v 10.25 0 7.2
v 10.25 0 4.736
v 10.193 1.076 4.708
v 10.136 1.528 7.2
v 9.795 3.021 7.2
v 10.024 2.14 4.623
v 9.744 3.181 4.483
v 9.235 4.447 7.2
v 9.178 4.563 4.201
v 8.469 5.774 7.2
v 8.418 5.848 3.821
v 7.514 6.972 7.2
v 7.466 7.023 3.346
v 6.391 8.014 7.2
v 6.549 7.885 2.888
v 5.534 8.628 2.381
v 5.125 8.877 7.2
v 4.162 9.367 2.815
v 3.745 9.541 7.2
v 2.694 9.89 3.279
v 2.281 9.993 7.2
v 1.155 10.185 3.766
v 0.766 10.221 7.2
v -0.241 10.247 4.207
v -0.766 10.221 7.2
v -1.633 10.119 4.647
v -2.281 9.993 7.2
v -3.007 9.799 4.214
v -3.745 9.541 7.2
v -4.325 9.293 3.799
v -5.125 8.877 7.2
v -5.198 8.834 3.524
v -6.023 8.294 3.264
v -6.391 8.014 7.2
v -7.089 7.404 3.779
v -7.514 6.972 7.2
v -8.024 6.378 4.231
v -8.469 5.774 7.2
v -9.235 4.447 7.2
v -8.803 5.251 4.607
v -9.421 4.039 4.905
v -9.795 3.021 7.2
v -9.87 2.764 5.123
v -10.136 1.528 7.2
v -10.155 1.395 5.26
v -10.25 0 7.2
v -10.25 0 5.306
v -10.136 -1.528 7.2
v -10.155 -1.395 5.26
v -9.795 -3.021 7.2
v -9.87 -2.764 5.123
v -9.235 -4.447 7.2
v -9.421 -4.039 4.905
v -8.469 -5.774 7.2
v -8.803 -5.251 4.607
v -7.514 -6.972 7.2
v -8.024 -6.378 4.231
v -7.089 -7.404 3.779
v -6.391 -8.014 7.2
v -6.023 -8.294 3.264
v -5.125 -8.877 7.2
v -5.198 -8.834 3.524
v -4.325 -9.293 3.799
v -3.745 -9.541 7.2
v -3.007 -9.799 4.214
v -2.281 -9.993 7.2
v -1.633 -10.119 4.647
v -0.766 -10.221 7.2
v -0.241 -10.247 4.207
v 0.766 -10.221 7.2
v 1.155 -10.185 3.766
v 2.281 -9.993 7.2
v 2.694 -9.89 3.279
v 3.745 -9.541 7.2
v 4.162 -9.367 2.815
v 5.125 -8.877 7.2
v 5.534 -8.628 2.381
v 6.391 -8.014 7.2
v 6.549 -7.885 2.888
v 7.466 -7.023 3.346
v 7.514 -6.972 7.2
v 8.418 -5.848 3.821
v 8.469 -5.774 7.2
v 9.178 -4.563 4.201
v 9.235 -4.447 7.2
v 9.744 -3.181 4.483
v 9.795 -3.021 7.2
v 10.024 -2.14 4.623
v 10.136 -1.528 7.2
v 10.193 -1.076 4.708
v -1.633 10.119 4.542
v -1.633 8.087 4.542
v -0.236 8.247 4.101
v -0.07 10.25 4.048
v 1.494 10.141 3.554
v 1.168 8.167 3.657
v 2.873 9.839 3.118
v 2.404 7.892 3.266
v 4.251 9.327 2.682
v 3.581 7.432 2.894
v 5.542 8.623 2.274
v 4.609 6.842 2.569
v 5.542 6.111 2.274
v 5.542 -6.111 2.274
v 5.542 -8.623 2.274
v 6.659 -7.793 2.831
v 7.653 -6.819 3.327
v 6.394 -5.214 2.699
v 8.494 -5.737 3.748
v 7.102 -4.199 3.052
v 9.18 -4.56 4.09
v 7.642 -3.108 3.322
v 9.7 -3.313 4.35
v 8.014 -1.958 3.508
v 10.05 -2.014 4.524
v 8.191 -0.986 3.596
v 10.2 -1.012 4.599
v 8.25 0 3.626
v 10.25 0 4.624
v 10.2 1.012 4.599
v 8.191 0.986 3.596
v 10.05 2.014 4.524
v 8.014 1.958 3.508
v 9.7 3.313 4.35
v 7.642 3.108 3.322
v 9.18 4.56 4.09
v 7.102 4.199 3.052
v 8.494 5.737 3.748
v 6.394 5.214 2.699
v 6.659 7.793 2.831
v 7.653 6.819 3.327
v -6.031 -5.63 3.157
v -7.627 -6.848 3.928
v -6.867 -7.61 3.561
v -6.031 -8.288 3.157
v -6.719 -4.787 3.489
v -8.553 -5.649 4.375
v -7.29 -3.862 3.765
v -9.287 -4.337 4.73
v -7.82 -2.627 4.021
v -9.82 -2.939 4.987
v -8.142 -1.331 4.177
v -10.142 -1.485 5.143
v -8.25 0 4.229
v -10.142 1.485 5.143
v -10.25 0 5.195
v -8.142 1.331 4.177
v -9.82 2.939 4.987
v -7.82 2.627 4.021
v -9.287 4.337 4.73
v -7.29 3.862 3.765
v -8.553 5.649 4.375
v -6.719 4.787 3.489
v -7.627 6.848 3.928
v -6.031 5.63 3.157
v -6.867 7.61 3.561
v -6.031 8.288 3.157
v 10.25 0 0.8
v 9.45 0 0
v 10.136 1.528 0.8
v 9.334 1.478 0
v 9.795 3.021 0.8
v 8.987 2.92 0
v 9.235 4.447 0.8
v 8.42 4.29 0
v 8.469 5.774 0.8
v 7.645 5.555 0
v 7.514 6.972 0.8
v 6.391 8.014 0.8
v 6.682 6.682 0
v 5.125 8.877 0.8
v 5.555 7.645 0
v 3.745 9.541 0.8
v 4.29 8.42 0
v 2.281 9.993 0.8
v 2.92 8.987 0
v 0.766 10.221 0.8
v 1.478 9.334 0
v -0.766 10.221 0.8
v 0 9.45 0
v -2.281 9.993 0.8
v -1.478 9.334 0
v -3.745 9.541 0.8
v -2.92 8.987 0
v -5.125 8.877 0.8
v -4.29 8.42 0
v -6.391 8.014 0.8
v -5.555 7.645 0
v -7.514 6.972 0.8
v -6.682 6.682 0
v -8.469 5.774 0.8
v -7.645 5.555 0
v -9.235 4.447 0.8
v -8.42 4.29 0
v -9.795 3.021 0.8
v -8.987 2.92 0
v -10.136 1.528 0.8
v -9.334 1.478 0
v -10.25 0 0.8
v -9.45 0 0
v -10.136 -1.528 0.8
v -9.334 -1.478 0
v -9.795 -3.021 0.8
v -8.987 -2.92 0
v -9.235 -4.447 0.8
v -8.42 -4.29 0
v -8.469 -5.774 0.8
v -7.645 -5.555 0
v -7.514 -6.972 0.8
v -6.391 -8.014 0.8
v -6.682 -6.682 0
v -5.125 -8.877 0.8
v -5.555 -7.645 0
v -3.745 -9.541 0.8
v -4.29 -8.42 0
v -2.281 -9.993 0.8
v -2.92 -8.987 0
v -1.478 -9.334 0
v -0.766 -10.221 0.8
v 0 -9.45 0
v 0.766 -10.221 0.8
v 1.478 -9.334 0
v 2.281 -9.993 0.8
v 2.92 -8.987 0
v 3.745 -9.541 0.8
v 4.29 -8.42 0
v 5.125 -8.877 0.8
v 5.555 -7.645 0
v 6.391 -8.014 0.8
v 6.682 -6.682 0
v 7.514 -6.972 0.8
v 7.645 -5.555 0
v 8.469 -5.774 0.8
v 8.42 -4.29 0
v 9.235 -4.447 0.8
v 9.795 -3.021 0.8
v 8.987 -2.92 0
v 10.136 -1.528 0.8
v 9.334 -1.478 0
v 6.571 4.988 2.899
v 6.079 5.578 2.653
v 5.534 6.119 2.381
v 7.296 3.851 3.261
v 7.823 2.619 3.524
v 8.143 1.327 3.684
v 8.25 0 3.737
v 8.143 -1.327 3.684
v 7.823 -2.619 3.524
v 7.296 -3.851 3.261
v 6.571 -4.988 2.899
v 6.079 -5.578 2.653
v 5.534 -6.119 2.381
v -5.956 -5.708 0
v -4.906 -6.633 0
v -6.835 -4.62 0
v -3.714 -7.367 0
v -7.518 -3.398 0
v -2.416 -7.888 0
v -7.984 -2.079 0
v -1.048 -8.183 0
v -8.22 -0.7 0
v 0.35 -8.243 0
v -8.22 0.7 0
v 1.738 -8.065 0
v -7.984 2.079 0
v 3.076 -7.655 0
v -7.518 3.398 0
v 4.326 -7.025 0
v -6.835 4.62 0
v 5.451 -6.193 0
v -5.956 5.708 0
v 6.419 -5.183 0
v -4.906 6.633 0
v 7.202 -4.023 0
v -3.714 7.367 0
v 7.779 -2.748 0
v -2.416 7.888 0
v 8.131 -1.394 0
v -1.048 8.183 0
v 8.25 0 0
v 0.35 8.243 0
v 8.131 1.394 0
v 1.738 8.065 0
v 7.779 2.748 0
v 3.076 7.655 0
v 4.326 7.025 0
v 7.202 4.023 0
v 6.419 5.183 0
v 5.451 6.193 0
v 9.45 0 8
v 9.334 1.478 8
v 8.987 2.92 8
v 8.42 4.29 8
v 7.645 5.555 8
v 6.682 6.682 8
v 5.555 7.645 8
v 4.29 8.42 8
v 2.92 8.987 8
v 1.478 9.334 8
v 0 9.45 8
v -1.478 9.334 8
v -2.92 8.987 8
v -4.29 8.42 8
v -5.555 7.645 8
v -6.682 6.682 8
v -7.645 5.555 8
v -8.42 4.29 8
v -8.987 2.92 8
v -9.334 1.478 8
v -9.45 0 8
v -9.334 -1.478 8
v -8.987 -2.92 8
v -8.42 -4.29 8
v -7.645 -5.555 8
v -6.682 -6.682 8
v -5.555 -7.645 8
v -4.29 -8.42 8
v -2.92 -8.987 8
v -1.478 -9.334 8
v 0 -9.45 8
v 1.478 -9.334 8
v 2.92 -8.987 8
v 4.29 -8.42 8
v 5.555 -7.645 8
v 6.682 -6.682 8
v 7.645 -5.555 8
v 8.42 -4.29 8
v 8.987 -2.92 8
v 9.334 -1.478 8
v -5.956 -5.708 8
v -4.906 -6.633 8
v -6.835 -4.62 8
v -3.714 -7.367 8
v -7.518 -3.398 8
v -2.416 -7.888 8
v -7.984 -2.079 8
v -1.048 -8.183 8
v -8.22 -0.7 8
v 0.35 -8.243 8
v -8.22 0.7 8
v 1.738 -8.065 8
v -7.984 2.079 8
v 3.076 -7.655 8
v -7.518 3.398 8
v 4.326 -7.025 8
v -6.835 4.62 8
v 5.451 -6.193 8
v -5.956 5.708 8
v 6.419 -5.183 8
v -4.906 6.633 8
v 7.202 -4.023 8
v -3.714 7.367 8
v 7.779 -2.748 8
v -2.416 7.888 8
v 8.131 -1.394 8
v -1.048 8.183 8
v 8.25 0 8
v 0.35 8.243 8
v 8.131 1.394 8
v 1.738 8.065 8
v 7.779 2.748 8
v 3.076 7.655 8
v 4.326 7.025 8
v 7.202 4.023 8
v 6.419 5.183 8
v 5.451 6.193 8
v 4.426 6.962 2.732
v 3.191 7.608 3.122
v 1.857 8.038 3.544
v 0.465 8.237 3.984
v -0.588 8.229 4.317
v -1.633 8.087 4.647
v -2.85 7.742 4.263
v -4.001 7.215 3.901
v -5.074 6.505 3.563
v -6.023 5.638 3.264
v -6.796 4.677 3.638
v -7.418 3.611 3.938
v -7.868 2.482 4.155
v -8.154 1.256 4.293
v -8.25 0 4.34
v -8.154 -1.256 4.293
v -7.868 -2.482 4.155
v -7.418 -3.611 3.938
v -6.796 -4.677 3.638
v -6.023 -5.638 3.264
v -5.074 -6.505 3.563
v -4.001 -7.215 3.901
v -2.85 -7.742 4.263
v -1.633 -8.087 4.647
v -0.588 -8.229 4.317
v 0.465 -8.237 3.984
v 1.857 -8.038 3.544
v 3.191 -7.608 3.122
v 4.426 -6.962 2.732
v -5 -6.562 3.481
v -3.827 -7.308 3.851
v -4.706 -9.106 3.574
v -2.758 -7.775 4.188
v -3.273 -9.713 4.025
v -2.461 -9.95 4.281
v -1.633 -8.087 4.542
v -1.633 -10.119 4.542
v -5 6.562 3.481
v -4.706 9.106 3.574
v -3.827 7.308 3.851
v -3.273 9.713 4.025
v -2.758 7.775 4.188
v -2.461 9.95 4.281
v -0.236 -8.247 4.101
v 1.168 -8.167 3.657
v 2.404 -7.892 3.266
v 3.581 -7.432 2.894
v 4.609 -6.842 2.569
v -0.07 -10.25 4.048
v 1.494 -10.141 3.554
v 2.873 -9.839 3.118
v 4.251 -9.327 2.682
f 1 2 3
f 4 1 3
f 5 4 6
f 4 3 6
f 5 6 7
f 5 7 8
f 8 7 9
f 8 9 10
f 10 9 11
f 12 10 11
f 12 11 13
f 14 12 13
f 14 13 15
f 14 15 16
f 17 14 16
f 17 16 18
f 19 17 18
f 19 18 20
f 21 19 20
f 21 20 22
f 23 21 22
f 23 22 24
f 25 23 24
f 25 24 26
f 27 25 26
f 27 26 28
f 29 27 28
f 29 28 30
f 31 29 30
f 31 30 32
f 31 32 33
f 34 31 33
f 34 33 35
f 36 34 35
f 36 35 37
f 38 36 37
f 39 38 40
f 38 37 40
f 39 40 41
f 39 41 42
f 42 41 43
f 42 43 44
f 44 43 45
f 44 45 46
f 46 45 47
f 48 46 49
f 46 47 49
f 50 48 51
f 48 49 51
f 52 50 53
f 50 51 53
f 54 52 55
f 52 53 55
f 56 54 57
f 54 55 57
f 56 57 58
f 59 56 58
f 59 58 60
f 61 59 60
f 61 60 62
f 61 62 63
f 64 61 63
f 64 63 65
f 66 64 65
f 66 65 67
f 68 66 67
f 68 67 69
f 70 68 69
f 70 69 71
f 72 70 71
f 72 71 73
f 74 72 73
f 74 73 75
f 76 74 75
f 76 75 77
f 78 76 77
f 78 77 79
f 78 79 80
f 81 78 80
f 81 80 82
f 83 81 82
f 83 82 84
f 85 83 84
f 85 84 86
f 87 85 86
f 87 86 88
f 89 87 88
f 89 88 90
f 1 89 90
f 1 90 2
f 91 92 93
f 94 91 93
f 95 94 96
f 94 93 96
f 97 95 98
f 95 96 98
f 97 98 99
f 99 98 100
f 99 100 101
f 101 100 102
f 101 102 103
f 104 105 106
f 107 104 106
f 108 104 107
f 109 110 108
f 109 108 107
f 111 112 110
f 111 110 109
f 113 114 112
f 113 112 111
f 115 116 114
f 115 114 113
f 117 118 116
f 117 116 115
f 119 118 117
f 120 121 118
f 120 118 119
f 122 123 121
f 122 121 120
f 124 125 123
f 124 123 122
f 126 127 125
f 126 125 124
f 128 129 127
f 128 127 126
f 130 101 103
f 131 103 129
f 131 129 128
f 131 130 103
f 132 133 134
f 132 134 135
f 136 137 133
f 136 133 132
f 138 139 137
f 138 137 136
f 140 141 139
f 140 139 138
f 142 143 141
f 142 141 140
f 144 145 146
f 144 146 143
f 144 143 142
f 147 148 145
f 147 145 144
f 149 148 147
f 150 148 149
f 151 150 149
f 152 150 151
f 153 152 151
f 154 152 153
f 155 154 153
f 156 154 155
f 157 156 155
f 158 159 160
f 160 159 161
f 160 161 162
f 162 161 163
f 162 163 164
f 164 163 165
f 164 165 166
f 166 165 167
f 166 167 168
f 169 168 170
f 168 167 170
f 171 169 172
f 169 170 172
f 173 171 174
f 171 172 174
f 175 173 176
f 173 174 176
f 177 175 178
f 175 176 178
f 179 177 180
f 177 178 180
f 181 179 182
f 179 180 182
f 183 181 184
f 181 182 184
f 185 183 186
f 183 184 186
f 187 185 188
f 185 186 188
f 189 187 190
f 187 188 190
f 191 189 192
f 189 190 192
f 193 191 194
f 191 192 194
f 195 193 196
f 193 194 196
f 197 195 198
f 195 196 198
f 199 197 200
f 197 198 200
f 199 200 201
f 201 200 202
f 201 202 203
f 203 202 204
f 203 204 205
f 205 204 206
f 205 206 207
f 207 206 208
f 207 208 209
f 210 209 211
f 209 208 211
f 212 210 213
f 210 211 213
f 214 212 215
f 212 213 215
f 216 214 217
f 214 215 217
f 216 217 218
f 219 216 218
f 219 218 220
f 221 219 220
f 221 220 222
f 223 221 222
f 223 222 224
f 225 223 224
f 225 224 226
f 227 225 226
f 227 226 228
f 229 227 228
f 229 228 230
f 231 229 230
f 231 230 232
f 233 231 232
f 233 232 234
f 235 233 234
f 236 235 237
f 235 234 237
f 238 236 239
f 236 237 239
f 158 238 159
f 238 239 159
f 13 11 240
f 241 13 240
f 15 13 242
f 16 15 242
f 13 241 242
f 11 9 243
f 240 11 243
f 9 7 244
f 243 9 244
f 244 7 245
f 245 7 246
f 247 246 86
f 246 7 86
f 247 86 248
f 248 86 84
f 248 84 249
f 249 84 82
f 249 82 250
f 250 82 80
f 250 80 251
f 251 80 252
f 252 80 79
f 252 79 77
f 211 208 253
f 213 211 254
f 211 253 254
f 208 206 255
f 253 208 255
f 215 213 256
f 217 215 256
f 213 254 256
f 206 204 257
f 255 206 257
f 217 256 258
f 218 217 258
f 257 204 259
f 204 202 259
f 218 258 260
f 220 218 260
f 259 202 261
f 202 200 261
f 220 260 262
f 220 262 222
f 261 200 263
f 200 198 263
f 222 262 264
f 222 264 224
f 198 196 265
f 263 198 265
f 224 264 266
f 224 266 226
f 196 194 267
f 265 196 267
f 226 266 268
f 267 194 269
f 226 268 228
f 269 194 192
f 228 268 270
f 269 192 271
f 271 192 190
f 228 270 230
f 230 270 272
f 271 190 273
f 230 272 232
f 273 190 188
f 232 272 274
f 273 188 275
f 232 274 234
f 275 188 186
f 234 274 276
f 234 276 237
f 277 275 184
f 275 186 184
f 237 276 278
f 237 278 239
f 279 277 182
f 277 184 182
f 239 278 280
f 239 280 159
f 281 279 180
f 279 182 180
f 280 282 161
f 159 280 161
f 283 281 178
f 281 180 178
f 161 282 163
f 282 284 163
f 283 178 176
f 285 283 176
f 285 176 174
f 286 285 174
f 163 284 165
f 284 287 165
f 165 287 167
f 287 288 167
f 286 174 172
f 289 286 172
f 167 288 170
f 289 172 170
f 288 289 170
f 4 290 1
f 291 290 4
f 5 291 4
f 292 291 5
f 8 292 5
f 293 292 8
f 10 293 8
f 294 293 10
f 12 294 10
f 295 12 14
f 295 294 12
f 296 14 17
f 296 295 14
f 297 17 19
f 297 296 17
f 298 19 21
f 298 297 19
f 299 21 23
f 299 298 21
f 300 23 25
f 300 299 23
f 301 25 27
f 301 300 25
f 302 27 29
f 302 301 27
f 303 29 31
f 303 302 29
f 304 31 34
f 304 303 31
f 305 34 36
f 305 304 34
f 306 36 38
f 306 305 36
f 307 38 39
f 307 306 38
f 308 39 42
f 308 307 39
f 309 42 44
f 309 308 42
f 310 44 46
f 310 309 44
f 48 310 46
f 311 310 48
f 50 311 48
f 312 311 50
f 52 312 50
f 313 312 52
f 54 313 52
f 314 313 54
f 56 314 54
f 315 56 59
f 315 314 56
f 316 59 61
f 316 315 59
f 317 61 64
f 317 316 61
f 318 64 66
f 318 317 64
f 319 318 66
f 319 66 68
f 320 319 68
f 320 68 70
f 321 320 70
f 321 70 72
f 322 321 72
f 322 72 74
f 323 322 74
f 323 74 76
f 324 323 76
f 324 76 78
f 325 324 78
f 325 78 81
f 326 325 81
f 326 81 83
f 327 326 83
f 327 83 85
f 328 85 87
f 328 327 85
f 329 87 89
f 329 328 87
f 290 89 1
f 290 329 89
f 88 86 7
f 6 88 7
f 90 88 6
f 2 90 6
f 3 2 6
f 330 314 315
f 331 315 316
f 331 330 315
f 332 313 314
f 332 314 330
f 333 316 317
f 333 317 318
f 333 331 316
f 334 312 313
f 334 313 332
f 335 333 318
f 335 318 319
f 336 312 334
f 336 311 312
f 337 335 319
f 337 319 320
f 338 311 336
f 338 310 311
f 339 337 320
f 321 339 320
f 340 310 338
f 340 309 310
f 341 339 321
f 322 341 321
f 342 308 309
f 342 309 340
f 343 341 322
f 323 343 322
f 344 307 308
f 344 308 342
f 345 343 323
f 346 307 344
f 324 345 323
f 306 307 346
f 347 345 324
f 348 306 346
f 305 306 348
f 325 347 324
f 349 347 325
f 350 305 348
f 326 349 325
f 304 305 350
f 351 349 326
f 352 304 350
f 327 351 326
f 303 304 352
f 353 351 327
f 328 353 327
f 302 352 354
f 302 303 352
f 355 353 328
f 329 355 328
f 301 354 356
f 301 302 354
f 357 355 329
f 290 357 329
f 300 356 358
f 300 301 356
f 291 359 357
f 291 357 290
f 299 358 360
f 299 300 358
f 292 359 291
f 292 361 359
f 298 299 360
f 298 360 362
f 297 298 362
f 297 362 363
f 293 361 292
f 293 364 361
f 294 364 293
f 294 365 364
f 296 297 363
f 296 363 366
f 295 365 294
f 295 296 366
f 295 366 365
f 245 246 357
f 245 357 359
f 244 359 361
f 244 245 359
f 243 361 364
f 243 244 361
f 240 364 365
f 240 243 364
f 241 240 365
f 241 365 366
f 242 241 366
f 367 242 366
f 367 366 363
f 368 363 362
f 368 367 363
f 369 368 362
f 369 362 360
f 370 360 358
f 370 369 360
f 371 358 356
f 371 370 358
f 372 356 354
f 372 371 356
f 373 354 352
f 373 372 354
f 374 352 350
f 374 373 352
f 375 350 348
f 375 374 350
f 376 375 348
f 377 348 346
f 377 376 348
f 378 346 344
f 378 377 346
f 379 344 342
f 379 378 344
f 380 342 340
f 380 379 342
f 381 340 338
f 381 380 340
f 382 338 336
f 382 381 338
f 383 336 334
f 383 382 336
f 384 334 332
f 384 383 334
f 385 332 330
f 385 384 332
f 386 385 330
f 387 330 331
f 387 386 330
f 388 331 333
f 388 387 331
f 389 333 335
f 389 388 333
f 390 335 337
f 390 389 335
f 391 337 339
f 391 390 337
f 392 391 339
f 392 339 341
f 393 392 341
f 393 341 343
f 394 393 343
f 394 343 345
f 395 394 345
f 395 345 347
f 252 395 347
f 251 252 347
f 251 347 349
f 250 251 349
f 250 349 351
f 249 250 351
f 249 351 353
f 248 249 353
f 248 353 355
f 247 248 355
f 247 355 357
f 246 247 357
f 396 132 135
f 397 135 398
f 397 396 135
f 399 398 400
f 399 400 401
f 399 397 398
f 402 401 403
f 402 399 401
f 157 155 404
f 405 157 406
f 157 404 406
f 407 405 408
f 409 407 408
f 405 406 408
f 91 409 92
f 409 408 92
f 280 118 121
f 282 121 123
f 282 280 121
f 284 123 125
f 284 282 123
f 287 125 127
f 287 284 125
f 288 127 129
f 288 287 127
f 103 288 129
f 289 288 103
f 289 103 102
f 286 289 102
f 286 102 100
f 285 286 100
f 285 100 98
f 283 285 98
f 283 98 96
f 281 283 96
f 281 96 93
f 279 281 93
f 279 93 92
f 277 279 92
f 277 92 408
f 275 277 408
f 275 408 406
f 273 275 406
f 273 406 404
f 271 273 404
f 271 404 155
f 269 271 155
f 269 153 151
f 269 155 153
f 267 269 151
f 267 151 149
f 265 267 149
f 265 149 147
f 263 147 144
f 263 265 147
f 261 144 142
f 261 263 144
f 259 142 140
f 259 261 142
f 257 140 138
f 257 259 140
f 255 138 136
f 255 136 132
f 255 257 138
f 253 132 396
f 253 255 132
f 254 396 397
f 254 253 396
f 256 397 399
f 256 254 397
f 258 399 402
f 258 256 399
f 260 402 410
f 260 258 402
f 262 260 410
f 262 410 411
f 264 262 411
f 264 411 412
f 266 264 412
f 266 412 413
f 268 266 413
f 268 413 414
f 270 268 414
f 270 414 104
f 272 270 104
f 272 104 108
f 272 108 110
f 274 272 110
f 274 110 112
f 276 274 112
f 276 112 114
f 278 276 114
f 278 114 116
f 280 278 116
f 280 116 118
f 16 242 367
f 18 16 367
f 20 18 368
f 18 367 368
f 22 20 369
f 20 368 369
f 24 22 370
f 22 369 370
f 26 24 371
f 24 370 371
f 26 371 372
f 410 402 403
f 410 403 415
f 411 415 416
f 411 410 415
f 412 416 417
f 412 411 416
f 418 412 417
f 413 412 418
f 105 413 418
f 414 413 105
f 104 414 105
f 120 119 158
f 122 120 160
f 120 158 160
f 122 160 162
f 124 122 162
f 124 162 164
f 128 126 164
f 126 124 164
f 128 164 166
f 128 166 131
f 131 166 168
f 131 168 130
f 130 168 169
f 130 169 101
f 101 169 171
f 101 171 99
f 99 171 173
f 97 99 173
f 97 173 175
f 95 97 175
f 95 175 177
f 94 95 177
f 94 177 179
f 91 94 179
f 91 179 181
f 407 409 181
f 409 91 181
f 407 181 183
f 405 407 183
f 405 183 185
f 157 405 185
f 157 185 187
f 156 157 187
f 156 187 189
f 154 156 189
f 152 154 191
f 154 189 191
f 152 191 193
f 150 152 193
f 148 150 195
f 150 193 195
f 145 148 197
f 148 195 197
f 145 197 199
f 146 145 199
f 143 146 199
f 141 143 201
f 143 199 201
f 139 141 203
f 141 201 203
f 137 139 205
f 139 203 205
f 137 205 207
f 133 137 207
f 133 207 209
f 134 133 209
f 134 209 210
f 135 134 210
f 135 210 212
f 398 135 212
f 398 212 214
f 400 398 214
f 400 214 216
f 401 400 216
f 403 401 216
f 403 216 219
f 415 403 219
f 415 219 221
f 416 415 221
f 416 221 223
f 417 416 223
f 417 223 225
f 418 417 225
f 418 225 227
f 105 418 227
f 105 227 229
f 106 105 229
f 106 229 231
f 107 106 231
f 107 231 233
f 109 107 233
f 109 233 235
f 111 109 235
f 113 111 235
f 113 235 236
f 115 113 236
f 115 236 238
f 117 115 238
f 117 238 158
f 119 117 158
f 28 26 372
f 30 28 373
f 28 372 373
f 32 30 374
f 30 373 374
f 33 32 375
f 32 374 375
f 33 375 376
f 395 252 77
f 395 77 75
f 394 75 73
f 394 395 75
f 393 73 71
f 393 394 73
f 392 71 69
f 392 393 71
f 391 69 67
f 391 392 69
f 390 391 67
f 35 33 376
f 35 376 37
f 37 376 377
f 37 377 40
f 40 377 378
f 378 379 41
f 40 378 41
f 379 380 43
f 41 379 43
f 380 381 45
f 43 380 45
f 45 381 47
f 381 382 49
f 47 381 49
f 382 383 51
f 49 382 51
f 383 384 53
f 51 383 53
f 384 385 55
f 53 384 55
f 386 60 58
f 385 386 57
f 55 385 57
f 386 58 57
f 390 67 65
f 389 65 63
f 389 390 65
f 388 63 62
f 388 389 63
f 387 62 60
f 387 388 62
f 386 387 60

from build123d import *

# Parameters (mm, degrees)
F0_R          = 10.25
F0_R_2        = 8.25
F1_DEPTH      = 8
F3_DEPTH      = 25
F3_DEPTH_BACK = 25
F4_SIZE       = 0.8


with BuildPart() as f1:
    # F0 (on Top) → F1 (new body)
    with BuildSketch(Plane.XY):
        Circle(F0_R)
        Circle(F0_R_2, mode=Mode.SUBTRACT)
    extrude(amount=F1_DEPTH)

    # F2 (on Front) → F3 (cut, two sides)
    with BuildSketch(Plane.XZ) as f3_sk:
        Polygon((-10.25, 5.3059905923), (-10.25, 5.1949330701), (-6.0306870126, 3.1566191479), (-1.6328110061, 4.5422517004), (5.5420904013, 2.2737164901), (10.25, 4.6241584094), (10.25, 4.7359284587), (9.7439247371, 4.4832684431), (5.5336400042, 2.3812676462), (-1.632758179, 4.6471143369), (-6.022904701, 3.2639171021), align=None)
    extrude(amount=-F3_DEPTH, mode=Mode.SUBTRACT)
    extrude(f3_sk.sketch, amount=F3_DEPTH_BACK, mode=Mode.SUBTRACT)

    # F4
    f4_edges = [f1.edges().sort_by_distance(p)[0] for p in [
        (-10.25, 0, 8),
        (-10.25, 0, 0),
    ]]
    chamfer(f4_edges, length=F4_SIZE)


solid = f1.part
